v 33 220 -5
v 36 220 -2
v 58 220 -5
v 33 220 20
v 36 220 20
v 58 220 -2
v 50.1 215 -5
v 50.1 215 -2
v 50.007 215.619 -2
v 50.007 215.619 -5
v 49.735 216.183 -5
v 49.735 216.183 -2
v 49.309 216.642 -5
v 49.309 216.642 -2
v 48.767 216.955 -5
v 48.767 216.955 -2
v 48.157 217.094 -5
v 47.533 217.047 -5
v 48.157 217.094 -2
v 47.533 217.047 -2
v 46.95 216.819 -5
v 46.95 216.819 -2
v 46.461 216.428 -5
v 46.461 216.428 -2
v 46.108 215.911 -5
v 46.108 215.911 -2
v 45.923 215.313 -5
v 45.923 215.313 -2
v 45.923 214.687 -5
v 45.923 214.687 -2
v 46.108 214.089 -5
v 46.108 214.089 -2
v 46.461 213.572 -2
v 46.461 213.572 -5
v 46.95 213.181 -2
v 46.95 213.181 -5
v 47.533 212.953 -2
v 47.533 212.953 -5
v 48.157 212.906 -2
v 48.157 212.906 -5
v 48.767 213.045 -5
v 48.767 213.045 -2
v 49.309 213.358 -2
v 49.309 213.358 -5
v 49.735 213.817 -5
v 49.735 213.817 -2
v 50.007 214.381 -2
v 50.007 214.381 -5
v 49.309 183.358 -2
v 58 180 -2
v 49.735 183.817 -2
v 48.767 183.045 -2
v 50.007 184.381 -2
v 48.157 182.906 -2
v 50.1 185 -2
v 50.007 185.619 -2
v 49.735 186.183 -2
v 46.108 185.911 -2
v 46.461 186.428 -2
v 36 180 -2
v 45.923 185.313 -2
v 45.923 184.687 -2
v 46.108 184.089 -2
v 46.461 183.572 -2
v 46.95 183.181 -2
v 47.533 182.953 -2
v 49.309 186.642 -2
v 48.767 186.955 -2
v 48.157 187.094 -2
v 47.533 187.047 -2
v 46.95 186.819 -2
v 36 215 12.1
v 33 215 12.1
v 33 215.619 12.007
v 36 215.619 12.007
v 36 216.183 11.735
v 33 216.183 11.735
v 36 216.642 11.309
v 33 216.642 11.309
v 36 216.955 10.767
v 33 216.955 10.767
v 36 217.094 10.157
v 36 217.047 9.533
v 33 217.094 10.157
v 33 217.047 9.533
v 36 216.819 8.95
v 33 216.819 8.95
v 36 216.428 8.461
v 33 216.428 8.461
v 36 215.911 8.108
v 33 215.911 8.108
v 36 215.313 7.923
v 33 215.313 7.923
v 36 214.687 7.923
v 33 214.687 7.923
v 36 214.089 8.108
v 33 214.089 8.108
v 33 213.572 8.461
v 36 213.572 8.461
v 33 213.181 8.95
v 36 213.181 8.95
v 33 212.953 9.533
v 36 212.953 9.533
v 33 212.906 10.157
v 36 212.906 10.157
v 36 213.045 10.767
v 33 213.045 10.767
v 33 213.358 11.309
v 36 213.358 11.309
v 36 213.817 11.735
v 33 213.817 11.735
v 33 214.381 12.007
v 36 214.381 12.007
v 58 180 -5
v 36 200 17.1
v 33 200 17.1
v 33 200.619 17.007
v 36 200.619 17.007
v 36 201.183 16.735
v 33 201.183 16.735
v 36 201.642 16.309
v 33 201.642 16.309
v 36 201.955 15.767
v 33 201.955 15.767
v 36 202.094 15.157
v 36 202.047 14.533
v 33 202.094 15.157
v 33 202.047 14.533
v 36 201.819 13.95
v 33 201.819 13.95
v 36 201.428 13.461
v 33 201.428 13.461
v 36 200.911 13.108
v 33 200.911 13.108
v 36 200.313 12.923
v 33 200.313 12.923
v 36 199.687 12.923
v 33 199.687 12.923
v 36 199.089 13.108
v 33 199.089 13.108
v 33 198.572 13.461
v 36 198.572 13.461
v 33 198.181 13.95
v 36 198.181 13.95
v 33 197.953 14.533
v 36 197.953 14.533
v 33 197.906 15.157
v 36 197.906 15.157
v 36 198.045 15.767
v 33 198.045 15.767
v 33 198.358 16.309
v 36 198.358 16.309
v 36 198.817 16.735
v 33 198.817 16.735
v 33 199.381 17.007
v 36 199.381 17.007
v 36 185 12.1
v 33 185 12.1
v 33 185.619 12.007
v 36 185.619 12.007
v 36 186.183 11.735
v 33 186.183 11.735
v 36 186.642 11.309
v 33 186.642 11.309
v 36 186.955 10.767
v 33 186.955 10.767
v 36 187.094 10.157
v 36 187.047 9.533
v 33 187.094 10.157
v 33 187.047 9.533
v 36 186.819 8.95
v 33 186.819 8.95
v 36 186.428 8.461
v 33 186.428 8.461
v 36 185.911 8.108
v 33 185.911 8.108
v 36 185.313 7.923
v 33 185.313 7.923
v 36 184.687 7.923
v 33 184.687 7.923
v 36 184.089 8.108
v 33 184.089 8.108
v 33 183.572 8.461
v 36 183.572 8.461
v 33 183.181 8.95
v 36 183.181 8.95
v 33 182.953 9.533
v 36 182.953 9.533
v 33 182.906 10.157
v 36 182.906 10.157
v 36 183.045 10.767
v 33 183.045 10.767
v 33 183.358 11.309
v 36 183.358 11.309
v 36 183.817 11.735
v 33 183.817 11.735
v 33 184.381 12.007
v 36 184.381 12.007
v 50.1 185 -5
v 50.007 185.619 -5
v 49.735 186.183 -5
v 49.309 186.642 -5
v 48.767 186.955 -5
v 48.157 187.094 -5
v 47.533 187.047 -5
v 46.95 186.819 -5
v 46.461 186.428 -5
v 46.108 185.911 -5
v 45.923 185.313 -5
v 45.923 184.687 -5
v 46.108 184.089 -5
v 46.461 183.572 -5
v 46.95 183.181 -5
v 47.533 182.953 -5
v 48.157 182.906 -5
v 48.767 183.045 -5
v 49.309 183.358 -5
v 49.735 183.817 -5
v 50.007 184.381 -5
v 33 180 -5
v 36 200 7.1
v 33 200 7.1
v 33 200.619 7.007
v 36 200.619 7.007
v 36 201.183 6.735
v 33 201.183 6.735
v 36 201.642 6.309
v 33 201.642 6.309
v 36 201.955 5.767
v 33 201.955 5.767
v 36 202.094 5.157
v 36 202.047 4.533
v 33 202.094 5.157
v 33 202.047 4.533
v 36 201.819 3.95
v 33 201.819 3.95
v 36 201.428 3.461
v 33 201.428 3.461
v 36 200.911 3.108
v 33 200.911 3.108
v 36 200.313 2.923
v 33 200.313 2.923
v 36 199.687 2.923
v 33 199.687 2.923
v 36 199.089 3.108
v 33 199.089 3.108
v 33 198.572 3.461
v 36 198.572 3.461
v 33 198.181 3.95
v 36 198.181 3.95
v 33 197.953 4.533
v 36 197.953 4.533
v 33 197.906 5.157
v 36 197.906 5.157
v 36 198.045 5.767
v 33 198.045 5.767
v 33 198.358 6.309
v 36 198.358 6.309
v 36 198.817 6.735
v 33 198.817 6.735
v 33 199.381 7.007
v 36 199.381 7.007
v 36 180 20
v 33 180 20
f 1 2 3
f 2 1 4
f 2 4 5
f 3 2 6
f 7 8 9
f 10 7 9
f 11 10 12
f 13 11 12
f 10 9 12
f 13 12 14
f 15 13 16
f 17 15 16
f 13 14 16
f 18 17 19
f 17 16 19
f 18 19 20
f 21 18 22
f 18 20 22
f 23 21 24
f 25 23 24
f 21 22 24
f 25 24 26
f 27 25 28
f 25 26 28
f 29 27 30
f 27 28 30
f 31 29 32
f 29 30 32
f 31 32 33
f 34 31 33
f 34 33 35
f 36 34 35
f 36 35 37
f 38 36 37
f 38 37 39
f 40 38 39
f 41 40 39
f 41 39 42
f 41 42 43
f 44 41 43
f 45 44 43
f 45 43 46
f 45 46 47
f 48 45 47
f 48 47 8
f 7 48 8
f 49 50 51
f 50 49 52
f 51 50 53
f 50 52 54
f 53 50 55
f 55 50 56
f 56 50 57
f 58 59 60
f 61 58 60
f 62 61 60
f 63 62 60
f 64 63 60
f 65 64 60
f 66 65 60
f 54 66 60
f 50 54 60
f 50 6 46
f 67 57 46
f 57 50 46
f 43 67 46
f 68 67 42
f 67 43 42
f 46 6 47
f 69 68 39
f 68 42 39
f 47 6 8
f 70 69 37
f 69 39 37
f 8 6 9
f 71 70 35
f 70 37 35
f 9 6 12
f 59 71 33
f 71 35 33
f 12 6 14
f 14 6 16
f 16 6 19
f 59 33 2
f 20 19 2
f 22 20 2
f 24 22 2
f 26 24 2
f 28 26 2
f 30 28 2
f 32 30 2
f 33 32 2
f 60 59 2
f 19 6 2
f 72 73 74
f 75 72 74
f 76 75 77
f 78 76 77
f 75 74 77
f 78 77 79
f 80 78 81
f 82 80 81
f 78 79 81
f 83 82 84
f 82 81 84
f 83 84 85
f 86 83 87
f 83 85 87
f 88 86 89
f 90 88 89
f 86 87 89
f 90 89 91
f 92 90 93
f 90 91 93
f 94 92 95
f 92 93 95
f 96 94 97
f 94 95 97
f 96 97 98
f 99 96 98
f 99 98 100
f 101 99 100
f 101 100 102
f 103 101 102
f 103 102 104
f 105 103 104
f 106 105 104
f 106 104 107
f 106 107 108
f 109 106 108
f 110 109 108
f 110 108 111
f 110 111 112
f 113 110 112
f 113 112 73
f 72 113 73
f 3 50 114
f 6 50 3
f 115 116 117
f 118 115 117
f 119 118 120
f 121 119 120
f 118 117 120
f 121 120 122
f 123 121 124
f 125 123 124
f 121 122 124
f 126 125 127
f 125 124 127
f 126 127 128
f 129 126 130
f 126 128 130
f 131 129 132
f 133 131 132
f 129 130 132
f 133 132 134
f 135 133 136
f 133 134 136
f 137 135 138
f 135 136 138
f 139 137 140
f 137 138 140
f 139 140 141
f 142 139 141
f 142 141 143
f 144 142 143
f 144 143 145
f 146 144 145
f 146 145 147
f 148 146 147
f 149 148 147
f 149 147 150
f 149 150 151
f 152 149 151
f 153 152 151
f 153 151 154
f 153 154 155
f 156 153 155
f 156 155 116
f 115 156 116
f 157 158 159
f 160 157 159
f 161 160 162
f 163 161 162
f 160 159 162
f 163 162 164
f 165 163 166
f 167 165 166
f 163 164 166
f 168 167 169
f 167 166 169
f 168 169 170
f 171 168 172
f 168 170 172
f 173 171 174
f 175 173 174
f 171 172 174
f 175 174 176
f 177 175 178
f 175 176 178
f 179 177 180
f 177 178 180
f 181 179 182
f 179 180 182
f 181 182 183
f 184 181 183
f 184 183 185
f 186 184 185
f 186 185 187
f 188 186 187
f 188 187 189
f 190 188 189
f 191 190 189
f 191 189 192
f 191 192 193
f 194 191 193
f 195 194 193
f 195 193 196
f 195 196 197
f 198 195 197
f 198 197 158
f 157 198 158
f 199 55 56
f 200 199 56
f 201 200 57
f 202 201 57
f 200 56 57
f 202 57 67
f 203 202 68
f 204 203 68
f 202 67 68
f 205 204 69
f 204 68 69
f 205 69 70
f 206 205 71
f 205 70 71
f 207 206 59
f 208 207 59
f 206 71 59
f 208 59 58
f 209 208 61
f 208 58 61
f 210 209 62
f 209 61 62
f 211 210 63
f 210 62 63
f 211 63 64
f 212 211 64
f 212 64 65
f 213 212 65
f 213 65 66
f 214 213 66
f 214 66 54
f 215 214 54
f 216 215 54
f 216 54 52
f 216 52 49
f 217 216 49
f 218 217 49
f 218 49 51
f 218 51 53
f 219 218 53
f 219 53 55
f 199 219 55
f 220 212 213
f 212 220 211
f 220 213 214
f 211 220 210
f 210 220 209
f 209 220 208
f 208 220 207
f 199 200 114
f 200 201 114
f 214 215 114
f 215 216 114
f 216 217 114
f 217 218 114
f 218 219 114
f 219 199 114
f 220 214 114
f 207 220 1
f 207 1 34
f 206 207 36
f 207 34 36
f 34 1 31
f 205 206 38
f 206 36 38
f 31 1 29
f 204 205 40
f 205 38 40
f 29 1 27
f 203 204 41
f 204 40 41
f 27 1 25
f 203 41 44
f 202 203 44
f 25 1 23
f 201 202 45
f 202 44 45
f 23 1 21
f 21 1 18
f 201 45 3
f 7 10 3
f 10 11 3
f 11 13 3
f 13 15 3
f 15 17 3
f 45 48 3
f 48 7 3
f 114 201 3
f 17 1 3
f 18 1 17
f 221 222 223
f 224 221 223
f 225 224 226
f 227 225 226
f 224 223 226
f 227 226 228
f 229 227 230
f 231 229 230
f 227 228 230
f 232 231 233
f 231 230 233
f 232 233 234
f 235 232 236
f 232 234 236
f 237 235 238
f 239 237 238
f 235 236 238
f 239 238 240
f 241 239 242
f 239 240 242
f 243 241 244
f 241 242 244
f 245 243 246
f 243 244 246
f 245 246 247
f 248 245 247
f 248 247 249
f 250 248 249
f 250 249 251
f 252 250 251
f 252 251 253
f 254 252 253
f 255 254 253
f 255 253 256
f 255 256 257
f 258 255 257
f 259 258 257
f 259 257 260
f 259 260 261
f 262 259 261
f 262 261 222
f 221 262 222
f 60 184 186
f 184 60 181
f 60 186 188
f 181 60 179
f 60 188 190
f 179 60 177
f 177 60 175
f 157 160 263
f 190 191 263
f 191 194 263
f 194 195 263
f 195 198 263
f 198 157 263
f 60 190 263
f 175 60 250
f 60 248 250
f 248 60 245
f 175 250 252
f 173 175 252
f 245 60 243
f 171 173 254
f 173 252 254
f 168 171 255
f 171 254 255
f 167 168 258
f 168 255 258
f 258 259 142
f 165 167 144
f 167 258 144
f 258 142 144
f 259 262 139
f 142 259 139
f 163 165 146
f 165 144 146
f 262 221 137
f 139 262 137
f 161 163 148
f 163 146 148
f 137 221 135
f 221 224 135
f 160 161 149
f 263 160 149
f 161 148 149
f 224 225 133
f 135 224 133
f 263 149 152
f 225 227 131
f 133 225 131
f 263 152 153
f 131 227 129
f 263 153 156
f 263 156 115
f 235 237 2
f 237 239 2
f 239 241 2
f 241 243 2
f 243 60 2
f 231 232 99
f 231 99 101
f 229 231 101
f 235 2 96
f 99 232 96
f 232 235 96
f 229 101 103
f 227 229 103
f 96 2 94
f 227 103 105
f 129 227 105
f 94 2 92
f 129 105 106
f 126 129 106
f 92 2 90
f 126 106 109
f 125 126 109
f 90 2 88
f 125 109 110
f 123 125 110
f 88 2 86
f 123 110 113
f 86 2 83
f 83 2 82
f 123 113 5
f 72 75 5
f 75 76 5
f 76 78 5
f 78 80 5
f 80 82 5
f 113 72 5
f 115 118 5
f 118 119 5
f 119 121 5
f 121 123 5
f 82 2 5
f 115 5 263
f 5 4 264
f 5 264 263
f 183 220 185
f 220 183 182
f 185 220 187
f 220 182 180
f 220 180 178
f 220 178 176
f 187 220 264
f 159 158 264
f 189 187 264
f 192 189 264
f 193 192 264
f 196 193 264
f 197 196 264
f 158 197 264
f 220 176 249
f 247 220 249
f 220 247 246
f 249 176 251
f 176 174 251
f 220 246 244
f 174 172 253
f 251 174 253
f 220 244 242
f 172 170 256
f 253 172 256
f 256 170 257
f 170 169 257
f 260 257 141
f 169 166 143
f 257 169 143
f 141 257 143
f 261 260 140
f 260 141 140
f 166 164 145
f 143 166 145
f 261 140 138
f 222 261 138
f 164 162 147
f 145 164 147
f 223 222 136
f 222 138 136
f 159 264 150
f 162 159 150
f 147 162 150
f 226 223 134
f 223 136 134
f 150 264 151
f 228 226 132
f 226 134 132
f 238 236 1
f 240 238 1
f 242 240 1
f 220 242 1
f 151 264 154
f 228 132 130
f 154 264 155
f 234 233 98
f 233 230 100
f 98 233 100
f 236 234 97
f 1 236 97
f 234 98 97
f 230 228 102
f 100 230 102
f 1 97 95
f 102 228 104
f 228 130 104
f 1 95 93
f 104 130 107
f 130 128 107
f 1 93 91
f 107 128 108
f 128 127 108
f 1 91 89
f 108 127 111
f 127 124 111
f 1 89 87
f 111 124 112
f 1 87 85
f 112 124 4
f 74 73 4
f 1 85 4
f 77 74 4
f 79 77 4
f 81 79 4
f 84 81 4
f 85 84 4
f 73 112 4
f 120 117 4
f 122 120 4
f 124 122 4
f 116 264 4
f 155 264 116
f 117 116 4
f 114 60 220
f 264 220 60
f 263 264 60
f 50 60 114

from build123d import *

# Parameters (mm, degrees)
SKETCH_1_W                  = 25
SKETCH_1_H                  = 40
EXTRUDE_1_DEPTH             = 25
SKETCH_2_W                  = 22
SKETCH_2_H                  = 22
CUT_EXTRUDE_1_DEPTH         = 74.239333694
HOLE_WIZARD_4_2_4_2_1_D     = 4.2
HOLE_WIZARD_4_2_4_2_1_DEPTH = 25
HOLE_WIZARD_4_2_4_2_2_D     = 4.2


with BuildPart() as part:
    # 草图1 → 凸台-拉伸1 (new body)
    with BuildSketch(Plane.XY.offset(20)):
        with Locations((45.5, 200)):
            Rectangle(SKETCH_1_W, SKETCH_1_H)
    extrude(amount=-EXTRUDE_1_DEPTH)

    # 草图2 → 切除-拉伸1 (cut, through all)
    with BuildSketch(Plane(origin=(0, 220, 0), x_dir=(-1, 0, 0), z_dir=(0, 1, 0))):
        with Locations((-47, 9)):
            Rectangle(SKETCH_2_W, SKETCH_2_H)
    extrude(amount=-CUT_EXTRUDE_1_DEPTH, mode=Mode.SUBTRACT)

    # Ø4.2 (4.2) 直径孔1
    with Locations(Plane(origin=(0, 0, -5), x_dir=(-1, 0, 0), z_dir=(0, 0, -1))):
        with Locations((-48, 185), (-48, 215)):
            Hole(HOLE_WIZARD_4_2_4_2_1_D / 2, depth=HOLE_WIZARD_4_2_4_2_1_DEPTH)

    # Ø4.2 (4.2) 直径孔2 (through all)
    with Locations(Plane(origin=(36, 0, 0), x_dir=(0, 0, -1), z_dir=(1, 0, 0))):
        with Locations((-10, 185), (-10, 215), (-5, 200), (-15, 200)):
            Hole(HOLE_WIZARD_4_2_4_2_2_D / 2)


solid = part.part
